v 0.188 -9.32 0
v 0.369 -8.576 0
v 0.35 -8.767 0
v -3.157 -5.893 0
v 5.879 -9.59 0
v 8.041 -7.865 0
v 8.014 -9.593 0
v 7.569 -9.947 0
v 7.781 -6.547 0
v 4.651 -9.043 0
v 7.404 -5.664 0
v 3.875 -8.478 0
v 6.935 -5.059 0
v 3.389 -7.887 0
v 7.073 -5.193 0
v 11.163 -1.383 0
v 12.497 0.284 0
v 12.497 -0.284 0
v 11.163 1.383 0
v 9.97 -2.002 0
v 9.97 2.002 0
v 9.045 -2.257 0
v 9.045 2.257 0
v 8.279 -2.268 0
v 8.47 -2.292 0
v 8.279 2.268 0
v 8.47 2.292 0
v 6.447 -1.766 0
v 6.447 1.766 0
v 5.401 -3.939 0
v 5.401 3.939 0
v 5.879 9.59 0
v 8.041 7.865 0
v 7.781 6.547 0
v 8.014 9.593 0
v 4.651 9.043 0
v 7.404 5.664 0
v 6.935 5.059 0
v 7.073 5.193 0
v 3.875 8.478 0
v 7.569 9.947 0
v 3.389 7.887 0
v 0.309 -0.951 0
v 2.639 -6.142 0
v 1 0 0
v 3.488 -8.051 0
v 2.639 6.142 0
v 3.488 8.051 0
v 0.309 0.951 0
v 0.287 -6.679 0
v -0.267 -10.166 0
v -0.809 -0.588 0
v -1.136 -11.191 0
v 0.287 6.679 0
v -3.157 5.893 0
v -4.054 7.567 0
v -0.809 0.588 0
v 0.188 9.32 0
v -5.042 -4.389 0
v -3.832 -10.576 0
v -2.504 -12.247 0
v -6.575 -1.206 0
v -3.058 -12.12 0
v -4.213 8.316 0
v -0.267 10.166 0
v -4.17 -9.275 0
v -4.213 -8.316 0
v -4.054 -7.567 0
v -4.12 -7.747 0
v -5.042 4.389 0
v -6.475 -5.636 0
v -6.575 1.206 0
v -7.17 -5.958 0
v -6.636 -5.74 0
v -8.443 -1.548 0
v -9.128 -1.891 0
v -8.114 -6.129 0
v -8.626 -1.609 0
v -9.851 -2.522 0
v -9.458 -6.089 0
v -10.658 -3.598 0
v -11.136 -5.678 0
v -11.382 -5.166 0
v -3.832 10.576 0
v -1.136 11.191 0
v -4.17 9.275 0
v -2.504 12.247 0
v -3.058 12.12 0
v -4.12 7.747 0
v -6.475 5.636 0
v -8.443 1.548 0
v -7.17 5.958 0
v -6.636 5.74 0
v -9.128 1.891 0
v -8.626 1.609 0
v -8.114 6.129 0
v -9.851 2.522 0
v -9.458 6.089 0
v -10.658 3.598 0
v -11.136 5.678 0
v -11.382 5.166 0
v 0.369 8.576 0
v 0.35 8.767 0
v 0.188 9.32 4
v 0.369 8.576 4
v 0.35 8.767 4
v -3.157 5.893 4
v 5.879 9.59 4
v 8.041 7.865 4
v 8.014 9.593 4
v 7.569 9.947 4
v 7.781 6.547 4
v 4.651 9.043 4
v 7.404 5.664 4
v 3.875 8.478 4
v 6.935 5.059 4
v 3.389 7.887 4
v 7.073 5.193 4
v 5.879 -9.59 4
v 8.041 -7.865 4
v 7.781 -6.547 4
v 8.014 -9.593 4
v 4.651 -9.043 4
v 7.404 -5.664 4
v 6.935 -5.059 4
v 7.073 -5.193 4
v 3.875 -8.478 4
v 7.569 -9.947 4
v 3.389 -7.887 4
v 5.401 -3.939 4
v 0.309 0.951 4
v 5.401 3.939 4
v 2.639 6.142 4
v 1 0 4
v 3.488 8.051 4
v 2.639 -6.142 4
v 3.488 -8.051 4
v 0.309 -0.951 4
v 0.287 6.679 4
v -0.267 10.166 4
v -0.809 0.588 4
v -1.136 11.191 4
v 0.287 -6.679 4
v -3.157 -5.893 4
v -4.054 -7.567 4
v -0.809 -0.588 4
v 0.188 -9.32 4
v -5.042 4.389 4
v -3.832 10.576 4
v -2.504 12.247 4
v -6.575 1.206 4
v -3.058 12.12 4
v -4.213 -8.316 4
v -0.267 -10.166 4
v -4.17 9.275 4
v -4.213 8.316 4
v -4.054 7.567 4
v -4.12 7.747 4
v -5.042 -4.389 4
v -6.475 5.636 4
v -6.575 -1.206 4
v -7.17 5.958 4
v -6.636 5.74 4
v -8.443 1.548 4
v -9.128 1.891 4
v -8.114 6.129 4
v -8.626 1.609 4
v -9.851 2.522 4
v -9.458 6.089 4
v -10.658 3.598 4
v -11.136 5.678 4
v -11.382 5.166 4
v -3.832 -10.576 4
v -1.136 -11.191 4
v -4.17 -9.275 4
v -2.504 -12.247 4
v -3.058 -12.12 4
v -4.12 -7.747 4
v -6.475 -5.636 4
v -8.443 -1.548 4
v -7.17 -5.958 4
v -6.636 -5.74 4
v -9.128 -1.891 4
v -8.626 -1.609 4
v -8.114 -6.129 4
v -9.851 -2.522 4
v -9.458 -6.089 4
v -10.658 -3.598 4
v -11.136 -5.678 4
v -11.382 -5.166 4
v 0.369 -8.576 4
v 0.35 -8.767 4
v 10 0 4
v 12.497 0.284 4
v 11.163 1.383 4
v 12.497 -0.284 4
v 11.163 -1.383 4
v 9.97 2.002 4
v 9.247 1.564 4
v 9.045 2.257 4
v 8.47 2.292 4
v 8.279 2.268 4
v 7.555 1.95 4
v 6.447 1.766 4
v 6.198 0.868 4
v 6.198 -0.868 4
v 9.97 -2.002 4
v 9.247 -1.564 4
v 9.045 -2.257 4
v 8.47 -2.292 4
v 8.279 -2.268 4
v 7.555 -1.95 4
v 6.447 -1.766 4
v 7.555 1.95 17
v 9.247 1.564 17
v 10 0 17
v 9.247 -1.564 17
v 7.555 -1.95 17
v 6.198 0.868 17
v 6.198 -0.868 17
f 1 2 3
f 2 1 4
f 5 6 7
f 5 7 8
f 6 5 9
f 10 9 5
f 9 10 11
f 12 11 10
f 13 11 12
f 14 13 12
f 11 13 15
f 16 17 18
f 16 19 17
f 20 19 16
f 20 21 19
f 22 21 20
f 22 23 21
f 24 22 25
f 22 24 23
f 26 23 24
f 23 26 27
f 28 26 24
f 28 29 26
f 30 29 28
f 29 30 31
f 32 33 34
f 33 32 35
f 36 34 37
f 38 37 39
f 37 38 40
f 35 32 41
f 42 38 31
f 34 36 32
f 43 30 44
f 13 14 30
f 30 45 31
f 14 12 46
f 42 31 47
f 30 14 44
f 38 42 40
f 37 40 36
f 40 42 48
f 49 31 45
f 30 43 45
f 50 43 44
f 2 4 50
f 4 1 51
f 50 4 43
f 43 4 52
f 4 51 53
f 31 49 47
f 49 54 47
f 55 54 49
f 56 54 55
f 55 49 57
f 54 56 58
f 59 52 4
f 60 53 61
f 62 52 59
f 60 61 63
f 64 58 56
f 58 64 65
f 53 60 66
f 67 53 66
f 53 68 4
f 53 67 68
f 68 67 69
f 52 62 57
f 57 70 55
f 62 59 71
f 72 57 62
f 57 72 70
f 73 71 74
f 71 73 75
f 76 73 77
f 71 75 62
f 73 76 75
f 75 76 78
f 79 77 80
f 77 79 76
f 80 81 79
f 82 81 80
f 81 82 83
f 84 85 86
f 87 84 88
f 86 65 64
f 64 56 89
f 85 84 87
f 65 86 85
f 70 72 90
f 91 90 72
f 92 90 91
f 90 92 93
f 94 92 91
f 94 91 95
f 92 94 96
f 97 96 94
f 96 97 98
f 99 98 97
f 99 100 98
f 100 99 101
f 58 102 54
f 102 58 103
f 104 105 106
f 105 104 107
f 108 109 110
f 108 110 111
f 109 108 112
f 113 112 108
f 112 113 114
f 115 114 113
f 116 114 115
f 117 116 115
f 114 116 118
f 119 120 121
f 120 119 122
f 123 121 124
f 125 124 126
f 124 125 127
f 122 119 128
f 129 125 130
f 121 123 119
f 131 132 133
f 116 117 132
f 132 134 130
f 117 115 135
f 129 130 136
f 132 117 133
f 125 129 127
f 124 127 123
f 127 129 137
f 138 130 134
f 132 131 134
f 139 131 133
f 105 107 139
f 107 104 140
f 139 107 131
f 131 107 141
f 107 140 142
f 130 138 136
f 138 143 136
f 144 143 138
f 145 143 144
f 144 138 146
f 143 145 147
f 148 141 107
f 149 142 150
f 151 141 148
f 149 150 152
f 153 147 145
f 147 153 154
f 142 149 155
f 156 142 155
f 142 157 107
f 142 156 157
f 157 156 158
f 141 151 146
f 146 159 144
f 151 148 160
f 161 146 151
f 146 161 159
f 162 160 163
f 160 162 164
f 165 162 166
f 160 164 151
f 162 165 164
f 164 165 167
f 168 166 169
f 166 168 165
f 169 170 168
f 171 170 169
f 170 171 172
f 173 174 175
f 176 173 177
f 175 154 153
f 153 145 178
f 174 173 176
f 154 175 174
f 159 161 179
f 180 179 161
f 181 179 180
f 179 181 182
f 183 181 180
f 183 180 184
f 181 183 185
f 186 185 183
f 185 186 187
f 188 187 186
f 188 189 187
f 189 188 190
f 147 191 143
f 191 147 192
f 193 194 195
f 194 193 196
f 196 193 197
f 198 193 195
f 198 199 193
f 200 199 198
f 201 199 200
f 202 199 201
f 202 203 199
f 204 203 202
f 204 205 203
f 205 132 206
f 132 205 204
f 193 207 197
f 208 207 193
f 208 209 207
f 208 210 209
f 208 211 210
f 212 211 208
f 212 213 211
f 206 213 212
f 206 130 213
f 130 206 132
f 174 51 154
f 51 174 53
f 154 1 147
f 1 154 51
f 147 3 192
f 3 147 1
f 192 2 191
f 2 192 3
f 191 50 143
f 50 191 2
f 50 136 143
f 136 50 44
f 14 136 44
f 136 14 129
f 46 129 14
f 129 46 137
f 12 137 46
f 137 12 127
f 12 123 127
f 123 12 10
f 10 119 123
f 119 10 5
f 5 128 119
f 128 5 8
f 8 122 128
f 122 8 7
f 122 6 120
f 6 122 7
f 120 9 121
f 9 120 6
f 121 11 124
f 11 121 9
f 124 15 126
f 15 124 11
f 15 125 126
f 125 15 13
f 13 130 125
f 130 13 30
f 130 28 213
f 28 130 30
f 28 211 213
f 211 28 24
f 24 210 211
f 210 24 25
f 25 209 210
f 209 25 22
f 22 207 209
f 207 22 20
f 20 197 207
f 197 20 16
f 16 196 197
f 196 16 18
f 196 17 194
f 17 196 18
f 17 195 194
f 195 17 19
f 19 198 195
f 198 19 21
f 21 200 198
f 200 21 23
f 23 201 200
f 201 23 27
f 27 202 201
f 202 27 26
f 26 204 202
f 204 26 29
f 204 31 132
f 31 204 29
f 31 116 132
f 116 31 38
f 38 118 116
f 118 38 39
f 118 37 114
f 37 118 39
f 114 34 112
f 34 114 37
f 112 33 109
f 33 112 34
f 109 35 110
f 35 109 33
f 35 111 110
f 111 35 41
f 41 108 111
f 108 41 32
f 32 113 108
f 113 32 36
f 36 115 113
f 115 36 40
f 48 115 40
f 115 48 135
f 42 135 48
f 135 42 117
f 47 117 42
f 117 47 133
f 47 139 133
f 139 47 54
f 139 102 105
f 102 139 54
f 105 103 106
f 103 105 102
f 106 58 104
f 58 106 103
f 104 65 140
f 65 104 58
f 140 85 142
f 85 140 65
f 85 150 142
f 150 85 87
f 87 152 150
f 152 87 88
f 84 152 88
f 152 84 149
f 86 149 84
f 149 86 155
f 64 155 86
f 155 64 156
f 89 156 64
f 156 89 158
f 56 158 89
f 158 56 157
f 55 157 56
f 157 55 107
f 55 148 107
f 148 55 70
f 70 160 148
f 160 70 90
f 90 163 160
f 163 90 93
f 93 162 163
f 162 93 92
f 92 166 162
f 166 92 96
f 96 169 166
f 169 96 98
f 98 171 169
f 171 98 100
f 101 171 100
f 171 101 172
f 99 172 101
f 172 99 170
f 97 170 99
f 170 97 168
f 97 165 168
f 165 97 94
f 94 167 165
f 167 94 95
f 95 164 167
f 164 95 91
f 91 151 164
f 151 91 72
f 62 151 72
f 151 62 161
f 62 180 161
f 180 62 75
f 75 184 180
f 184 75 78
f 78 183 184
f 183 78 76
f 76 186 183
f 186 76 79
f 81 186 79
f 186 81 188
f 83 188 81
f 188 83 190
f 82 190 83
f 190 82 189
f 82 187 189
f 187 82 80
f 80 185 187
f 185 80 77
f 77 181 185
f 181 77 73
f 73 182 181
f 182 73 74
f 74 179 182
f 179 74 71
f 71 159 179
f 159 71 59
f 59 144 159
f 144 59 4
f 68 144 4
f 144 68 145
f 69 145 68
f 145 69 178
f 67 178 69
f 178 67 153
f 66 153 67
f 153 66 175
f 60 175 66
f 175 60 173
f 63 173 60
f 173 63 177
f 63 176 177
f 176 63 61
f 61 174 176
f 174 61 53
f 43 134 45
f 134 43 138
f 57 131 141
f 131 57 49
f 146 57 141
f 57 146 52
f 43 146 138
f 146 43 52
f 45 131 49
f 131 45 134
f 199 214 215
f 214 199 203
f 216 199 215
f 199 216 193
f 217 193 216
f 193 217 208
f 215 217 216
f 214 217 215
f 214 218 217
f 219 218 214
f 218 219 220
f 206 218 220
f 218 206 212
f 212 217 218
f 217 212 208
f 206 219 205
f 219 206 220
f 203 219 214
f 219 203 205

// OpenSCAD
use <MCAD/involute_gears.scad>

// dia = (number_of_teeth + 2) / (180 / 500)
module flat_gear(number_of_teeth) {
	gear(
		circular_pitch = 500,
		number_of_teeth = number_of_teeth,
		gear_thickness = 4,
		rim_thickness = 4,
		hub_thickness = 4,
		bore_diameter = 2
	);

}

module gear_wheel() {
	difference() {
		union() {
			// dia = 80.56
			flat_gear(
				number_of_teeth = 27
			);
	
			translate(v = [0, 0, 4])
			difference() {
				cylinder(h = 5, r = 35);
				cylinder(h = 5, r = 1);
			}
		}
	
		for (i = [0 : 36 : 359]) {
			rotate(a = i)
				translate(v = [0, 25, 0])
				cylinder(h = 9, r = 6);
		}
	}
}

module pinion() {
	// dia = 25
	flat_gear(
		number_of_teeth = 7
	);
	
	translate(v = [8, 0, 2])
	cylinder(h = 15, r = 2);
}

module ball_channel(length, diverter = false, endcap = false, mask = false) {
	translate(v = [-(16/2), -(length/2), (8/2)])
	rotate(a = -90, v = [1, 0, 0])
	union() {
		difference() {
			cube(
				size = [16, 8, length]
			);
			
			translate(v = [8, 0, 0])
			cylinder(
				h = length,
				r = 6,
				$fn = 100
			);
	
			if (diverter) {
				polyhedron(
					points = [
						[0, 0, 0],
						[16, 0, 0],
						[16, 8, 0],
						[0, 8, 0],
						[0, 0, 16],
						[0, 8, 16]
					],
					faces = [
						[0, 1, 2, 3],
						[0, 4, 1],
						[3, 2, 5],
						[0, 3, 5, 4],
						[1, 4, 5, 2]
					]
				);
	
				translate(v = [8, 0, 0])
				cube(
					size = [8, 6, 25]
				);
			}
		}

		if (mask && diverter) {
			translate(v = [8, 0, sqrt(2*2+2*2)])
			cube(
				size = [8*2, 6, 25]
			);
		}
	
		if (diverter) {
			difference() {
				translate(v = [0, 0, 16])
				rotate(a = 45, v = [0, 1, 0])
				cube(
					size = [sqrt(16*16+16*16), 8, 2]
				);
	
				translate(v = [16, 0, 0])
				cube(size = [2, 8, 3]);
			}
		}

		if (endcap) {
				translate(v = [0, 0, length])
				cube(
					size = [16, 8, 2]
				);

		}
	}
}

module position_ball_channel(angle, level = 0) {
	translate(v = [16*level, 0, 8*level])
	rotate(a = angle, v = [1, 0, 0])
	children();
}


module ball_ladder() {
	position_ball_channel(angle = 3, level = 3)
	translate(v = [0, 2.5, 0])
	mirror([1, 0, 0])
	ball_channel(length = 80, diverter = true);
	
	difference() {
		position_ball_channel(angle = -3, level = 2)
		translate(v = [0, -5, 0])
		rotate(a = 180, v = [0, 0, 1])
		ball_channel(length = 75, diverter = true, endcap = true);
	
		position_ball_channel(angle = 3, level = 3)
		translate(v = [0, 2.5, 0])
		mirror([1, 0, 0])
		ball_channel(length = 80, diverter = true, mask = true);
	}
	
	difference() {
		position_ball_channel(angle = 3, level = 1)
		mirror([1, 0, 0])
		ball_channel(length = 75, diverter = true, endcap = true);
	
		position_ball_channel(angle = -3, level = 2)
		translate(v = [0, -5, 0])
		rotate(a = 180, v = [0, 0, 1])
		ball_channel(length = 75, diverter = true, endcap = true, mask = true);
	}
	
	difference() {
		position_ball_channel(angle = -3)
		translate(v = [0, 25/2, 0])
		mirror([0, 1, 0])
		ball_channel(length = 85+25, endcap = true);
	
		position_ball_channel(angle = 3, level = 1)
		mirror([1, 0, 0])
		ball_channel(length = 75, diverter = true, endcap = true, mask = true);
	}
}

module ball_ladder_support() {
	polyhedron(
		points = [
			// back points
			[16*3+8, 80/2+2.6, 8*3-1.5],
			[16*3+8, 80/2+2.6, -28.5],
			[16*3-8, 80/2+2.6, 8*3-1.5],
			[16*3-8, 80/2+2.6, -28.5],

			// front points
			[16*3+8, -80/2+18.5, 8*3-5],
			[16*3+8, -80/2+18.5, -28.5],
			[16*3-8, -80/2+3, 8*3-6],
			[16*3-8, -80/2+3, -28.5],
		],
		faces = [
			[0, 2, 3, 1],
			[6, 4, 5, 7],
			[4, 0, 1, 5],
			[2, 6, 7, 3],
			[1, 3, 7, 5],
			[6, 2, 0, 4]
		]
	);

	polyhedron(
		points = [
			// back points
			[16*2+8, 75/2-21.5, 8*2-4.5],
			[16*2+8, 75/2-21.5, -28.5],
			[16*2-8, 75/2-5, 8*2-5.5],
			[16*2-8, 75/2-5, -28.5],

			// front points
			[16*2+8, -75/2-7.2, 8*2-1.5],
			[16*2+8, -75/2-7.2, -28.5],
			[16*2-8, -75/2-7.2, 8*2-1.5],
			[16*2-8, -75/2-7.2, -28.5],
		],
		faces = [
			[0, 2, 3, 1],
			[6, 4, 5, 7],
			[4, 0, 1, 5],
			[2, 6, 7, 3],
			[1, 3, 7, 5],
			[6, 2, 0, 4]
		]
	);

	polyhedron(
		points = [
			// back points
			[16*1+8, 75/2+2, 8*1-1.75],
			[16*1+8, 75/2+2, -28.5],
			[16*1-8, 75/2+2, 8*1-1.75],
			[16*1-8, 75/2+2, -28.5],

			// front points
			[16*1+8, -75/2+16.5, 8*1-5],
			[16*1+8, -75/2+16.5, -28.5],
			[16*1-8, -75/2, 8*1-6],
			[16*1-8, -75/2, -28.5],
		],
		faces = [
			[0, 2, 3, 1],
			[6, 4, 5, 7],
			[4, 0, 1, 5],
			[2, 6, 7, 3],
			[1, 3, 7, 5],
			[6, 2, 0, 4]
		]
	);

	polyhedron(
		points = [
			// back points
			[16*0+8, 80/2+27.25, 8*0-7.25],
			[16*0+8, 80/2+27.25-10, -28.5],
			[16*0-8, 80/2+27.25, 8*0-7.25],
			[16*0-8, 80/2+27.25-10, -28.5],

			// front points
			[16*0+8, -80/2-4.7, 8*0-1.5],
			[16*0+8, -80/2-4.7, -28.5],
			[16*0-8, -80/2-4.7, 8*0-1.5],
			[16*0-8, -80/2-4.7, -28.5],
		],
		faces = [
			[0, 2, 3, 1],
			[6, 4, 5, 7],
			[4, 0, 1, 5],
			[2, 6, 7, 3],
			[1, 3, 7, 5],
			[6, 2, 0, 4]
		]
	);
}

//gear_wheel();
//translate(v = [55, 0, 0])
pinion();

//ball_ladder();
//color([0, 1, 1])
//ball_ladder_support();

//color([1, 0, 1])
//translate(v = [16*0+8, -80/2-4.5, 8*0-1.5])
//cube(size=[0.5, 0.5, 0.5], center = true);
